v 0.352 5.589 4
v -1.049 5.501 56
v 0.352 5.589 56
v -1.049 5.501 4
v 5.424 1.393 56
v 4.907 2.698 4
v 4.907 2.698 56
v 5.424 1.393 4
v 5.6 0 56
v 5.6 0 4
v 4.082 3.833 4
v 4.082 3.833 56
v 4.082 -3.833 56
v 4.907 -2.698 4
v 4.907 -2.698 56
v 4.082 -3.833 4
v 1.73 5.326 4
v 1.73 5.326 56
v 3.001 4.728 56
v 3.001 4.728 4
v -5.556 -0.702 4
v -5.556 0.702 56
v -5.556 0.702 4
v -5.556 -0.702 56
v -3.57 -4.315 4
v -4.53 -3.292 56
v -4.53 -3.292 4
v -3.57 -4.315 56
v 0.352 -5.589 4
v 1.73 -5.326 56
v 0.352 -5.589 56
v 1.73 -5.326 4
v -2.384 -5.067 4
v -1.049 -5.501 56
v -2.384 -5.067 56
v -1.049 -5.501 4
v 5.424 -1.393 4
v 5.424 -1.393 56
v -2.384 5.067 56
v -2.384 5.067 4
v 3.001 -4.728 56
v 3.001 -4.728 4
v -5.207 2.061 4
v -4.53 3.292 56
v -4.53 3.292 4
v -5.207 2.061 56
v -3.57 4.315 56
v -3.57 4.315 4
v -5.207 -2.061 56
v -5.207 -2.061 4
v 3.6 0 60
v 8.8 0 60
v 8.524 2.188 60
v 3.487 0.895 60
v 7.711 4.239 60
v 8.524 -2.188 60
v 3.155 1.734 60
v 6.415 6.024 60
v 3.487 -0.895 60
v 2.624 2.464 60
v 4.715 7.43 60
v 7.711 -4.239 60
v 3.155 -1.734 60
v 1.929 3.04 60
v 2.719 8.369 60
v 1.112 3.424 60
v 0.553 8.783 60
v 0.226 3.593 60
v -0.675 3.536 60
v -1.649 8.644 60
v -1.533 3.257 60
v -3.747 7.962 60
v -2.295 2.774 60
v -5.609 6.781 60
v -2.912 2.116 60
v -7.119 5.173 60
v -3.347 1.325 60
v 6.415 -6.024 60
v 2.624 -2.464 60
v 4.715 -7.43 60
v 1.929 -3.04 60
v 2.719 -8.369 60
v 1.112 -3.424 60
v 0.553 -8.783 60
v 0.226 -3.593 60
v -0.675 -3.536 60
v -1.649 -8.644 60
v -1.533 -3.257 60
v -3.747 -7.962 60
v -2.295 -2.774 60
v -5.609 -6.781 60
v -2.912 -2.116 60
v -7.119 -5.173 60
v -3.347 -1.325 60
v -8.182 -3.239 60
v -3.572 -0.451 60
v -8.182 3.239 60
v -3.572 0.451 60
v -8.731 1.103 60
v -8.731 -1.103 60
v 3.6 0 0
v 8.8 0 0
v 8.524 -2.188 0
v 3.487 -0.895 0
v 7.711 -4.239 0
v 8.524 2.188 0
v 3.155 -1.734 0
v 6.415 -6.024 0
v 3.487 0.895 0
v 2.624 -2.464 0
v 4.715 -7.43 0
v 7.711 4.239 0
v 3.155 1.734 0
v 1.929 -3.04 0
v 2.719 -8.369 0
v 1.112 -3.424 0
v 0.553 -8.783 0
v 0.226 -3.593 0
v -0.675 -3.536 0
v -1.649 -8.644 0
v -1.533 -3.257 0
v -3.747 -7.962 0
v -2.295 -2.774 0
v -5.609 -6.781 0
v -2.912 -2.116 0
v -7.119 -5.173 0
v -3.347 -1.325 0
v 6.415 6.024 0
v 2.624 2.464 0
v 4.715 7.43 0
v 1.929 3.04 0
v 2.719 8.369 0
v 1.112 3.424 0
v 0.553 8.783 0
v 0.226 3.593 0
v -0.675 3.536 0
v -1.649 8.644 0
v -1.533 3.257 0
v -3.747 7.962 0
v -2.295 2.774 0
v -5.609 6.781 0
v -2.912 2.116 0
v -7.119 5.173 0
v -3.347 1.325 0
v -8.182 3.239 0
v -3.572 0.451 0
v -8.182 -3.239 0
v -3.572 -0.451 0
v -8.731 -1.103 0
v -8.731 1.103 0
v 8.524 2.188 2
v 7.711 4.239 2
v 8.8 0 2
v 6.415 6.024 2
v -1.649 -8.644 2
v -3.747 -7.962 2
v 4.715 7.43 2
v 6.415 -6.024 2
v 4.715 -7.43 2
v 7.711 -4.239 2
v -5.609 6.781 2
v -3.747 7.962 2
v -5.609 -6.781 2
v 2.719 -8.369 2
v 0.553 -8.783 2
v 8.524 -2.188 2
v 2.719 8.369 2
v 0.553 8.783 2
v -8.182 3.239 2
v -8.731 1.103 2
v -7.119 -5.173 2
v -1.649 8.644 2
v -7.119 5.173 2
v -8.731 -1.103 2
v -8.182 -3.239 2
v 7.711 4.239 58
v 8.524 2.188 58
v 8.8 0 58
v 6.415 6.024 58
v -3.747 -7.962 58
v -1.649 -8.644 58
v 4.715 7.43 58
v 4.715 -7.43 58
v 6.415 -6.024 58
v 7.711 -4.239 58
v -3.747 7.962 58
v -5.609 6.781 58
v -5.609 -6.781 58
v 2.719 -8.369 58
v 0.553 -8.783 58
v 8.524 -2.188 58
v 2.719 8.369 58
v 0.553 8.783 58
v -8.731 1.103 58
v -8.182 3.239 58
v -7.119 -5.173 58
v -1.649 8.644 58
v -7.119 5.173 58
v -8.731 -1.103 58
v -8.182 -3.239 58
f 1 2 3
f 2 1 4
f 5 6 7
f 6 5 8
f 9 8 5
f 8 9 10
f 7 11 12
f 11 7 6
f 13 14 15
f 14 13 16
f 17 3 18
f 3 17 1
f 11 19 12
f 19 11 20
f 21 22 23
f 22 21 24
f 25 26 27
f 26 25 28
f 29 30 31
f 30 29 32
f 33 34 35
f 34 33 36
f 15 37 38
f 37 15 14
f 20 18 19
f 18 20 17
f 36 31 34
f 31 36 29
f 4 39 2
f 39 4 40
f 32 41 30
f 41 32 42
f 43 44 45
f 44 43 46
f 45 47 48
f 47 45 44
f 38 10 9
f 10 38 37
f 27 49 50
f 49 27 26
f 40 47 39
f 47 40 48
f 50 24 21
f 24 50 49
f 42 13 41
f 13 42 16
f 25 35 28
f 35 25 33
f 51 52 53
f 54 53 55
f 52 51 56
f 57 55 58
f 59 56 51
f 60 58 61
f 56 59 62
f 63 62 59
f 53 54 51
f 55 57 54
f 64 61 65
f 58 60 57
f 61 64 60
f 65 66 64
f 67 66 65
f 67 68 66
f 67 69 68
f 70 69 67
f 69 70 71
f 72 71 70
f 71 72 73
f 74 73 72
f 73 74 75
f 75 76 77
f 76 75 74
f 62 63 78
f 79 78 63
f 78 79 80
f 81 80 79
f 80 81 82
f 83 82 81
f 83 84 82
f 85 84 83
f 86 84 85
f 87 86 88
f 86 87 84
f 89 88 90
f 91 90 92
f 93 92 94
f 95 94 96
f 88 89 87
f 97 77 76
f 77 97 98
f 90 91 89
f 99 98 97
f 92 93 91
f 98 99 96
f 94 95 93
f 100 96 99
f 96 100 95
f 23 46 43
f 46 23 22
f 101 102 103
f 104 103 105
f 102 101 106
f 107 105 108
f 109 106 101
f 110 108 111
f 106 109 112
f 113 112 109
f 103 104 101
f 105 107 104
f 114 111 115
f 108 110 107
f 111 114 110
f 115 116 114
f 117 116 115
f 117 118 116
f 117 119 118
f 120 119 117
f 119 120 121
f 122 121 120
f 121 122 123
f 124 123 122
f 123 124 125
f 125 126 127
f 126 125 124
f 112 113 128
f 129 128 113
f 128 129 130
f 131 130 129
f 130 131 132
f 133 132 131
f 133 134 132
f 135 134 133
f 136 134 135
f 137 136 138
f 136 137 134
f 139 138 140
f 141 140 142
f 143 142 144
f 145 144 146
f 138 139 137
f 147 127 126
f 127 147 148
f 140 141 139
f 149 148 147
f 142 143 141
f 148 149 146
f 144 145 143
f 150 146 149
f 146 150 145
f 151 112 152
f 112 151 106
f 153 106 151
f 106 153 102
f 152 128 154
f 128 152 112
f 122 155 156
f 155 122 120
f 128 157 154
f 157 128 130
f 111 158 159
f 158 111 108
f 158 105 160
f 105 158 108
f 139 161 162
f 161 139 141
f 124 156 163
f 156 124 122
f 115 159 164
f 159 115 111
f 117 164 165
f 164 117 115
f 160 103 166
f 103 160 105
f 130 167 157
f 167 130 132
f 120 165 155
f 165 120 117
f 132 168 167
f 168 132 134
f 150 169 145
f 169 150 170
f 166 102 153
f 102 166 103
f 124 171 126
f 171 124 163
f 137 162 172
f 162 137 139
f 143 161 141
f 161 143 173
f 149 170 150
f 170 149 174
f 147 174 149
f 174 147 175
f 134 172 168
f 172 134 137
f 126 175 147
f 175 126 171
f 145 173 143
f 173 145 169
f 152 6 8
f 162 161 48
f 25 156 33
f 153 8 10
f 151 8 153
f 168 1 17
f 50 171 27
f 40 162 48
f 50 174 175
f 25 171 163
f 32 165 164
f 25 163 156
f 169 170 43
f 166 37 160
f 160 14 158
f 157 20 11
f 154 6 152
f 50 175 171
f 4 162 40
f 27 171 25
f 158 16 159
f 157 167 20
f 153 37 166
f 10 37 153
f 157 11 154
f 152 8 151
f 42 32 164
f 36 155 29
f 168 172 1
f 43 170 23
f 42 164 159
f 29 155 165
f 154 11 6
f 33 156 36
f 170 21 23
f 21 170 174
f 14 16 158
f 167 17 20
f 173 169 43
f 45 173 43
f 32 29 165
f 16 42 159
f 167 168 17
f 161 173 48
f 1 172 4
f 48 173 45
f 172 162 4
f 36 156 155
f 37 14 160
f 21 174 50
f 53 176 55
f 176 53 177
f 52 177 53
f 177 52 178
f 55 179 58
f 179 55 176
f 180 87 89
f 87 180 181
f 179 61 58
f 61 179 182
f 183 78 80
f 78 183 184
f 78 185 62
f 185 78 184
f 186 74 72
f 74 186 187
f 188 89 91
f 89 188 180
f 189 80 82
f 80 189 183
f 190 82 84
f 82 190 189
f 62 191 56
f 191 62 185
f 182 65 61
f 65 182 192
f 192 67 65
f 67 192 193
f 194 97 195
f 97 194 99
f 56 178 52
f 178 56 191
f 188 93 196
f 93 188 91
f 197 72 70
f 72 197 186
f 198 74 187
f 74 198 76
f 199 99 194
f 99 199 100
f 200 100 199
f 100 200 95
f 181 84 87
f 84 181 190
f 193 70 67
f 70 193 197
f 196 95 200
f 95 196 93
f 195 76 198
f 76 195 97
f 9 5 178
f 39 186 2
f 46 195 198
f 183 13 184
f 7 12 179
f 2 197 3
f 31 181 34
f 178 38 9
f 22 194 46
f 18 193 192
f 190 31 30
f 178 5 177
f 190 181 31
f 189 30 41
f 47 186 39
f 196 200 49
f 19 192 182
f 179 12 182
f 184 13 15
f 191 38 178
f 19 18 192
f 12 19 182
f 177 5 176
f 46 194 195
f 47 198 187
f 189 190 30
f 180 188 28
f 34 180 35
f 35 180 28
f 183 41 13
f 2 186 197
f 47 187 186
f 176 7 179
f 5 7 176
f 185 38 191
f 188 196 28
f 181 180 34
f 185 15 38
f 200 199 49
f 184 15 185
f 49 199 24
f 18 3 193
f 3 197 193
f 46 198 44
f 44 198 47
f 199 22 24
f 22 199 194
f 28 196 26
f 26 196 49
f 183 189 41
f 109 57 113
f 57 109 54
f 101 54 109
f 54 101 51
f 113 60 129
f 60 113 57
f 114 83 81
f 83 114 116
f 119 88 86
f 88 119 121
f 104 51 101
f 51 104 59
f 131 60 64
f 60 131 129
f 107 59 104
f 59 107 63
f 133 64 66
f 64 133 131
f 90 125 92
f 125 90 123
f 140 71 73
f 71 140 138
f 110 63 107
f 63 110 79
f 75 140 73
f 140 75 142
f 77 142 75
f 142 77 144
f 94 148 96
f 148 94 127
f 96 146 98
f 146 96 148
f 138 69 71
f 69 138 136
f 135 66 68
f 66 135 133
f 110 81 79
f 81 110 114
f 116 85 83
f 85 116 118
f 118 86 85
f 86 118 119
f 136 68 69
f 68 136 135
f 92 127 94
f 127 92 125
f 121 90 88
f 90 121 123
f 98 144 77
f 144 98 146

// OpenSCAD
/* 
Thread-Spool for use with Singer Professional XL1000 sewing machine
by zeus - zeus@ctdo.de - 2014-12-11
remixed from "Thread Spool" ( http://www.thingiverse.com/thing:28902 )
by Mike Creuzer - Mike@Creuzer.com 20120820

With this spool you can re-spool thread from bigger spools, which have too much 
mass and tend to cut off or break your needle. Unfortunately its not fully automatic, 
because you have to use your fingers to guide the tread while respooling, to make
sure, that the spool is evenly filled, becuase the respooler is originally designed 
to spool the under-thread-spool.
*/ 



// Parameters are in mm

// The radius of the spool (half the diameter)
spool_radius = 5.6; // 17.6 / 2 for the toy I used
// The height of the spool
spool_height = 60.0;

// The top and bottom radius
lip_radius = 8.8; // 21.6 / 2 for the toy I used
// The height of the top and bottom
lip_height = 2.0;

// The radius of the whole in the center
spindle_radius = 3.6; // 7.4/2

$fn=25;

difference()
{
	union() // Make the spool
	{
		cylinder(r=spool_radius, h=spool_height);
		cylinder(r=lip_radius, h=lip_height);
		translate([0,0,lip_height]) cylinder(r1=lip_radius, r2 = spool_radius, h=lip_height);
		translate([0,0,spool_height-lip_height]) cylinder(r=lip_radius, h=lip_height);
		translate([0,0,spool_height-lip_height-lip_height]) cylinder(r2=lip_radius, r1 = spool_radius, h=lip_height);
	}
	cylinder(r=spindle_radius, h=spool_height); // The hole down the middle
}
